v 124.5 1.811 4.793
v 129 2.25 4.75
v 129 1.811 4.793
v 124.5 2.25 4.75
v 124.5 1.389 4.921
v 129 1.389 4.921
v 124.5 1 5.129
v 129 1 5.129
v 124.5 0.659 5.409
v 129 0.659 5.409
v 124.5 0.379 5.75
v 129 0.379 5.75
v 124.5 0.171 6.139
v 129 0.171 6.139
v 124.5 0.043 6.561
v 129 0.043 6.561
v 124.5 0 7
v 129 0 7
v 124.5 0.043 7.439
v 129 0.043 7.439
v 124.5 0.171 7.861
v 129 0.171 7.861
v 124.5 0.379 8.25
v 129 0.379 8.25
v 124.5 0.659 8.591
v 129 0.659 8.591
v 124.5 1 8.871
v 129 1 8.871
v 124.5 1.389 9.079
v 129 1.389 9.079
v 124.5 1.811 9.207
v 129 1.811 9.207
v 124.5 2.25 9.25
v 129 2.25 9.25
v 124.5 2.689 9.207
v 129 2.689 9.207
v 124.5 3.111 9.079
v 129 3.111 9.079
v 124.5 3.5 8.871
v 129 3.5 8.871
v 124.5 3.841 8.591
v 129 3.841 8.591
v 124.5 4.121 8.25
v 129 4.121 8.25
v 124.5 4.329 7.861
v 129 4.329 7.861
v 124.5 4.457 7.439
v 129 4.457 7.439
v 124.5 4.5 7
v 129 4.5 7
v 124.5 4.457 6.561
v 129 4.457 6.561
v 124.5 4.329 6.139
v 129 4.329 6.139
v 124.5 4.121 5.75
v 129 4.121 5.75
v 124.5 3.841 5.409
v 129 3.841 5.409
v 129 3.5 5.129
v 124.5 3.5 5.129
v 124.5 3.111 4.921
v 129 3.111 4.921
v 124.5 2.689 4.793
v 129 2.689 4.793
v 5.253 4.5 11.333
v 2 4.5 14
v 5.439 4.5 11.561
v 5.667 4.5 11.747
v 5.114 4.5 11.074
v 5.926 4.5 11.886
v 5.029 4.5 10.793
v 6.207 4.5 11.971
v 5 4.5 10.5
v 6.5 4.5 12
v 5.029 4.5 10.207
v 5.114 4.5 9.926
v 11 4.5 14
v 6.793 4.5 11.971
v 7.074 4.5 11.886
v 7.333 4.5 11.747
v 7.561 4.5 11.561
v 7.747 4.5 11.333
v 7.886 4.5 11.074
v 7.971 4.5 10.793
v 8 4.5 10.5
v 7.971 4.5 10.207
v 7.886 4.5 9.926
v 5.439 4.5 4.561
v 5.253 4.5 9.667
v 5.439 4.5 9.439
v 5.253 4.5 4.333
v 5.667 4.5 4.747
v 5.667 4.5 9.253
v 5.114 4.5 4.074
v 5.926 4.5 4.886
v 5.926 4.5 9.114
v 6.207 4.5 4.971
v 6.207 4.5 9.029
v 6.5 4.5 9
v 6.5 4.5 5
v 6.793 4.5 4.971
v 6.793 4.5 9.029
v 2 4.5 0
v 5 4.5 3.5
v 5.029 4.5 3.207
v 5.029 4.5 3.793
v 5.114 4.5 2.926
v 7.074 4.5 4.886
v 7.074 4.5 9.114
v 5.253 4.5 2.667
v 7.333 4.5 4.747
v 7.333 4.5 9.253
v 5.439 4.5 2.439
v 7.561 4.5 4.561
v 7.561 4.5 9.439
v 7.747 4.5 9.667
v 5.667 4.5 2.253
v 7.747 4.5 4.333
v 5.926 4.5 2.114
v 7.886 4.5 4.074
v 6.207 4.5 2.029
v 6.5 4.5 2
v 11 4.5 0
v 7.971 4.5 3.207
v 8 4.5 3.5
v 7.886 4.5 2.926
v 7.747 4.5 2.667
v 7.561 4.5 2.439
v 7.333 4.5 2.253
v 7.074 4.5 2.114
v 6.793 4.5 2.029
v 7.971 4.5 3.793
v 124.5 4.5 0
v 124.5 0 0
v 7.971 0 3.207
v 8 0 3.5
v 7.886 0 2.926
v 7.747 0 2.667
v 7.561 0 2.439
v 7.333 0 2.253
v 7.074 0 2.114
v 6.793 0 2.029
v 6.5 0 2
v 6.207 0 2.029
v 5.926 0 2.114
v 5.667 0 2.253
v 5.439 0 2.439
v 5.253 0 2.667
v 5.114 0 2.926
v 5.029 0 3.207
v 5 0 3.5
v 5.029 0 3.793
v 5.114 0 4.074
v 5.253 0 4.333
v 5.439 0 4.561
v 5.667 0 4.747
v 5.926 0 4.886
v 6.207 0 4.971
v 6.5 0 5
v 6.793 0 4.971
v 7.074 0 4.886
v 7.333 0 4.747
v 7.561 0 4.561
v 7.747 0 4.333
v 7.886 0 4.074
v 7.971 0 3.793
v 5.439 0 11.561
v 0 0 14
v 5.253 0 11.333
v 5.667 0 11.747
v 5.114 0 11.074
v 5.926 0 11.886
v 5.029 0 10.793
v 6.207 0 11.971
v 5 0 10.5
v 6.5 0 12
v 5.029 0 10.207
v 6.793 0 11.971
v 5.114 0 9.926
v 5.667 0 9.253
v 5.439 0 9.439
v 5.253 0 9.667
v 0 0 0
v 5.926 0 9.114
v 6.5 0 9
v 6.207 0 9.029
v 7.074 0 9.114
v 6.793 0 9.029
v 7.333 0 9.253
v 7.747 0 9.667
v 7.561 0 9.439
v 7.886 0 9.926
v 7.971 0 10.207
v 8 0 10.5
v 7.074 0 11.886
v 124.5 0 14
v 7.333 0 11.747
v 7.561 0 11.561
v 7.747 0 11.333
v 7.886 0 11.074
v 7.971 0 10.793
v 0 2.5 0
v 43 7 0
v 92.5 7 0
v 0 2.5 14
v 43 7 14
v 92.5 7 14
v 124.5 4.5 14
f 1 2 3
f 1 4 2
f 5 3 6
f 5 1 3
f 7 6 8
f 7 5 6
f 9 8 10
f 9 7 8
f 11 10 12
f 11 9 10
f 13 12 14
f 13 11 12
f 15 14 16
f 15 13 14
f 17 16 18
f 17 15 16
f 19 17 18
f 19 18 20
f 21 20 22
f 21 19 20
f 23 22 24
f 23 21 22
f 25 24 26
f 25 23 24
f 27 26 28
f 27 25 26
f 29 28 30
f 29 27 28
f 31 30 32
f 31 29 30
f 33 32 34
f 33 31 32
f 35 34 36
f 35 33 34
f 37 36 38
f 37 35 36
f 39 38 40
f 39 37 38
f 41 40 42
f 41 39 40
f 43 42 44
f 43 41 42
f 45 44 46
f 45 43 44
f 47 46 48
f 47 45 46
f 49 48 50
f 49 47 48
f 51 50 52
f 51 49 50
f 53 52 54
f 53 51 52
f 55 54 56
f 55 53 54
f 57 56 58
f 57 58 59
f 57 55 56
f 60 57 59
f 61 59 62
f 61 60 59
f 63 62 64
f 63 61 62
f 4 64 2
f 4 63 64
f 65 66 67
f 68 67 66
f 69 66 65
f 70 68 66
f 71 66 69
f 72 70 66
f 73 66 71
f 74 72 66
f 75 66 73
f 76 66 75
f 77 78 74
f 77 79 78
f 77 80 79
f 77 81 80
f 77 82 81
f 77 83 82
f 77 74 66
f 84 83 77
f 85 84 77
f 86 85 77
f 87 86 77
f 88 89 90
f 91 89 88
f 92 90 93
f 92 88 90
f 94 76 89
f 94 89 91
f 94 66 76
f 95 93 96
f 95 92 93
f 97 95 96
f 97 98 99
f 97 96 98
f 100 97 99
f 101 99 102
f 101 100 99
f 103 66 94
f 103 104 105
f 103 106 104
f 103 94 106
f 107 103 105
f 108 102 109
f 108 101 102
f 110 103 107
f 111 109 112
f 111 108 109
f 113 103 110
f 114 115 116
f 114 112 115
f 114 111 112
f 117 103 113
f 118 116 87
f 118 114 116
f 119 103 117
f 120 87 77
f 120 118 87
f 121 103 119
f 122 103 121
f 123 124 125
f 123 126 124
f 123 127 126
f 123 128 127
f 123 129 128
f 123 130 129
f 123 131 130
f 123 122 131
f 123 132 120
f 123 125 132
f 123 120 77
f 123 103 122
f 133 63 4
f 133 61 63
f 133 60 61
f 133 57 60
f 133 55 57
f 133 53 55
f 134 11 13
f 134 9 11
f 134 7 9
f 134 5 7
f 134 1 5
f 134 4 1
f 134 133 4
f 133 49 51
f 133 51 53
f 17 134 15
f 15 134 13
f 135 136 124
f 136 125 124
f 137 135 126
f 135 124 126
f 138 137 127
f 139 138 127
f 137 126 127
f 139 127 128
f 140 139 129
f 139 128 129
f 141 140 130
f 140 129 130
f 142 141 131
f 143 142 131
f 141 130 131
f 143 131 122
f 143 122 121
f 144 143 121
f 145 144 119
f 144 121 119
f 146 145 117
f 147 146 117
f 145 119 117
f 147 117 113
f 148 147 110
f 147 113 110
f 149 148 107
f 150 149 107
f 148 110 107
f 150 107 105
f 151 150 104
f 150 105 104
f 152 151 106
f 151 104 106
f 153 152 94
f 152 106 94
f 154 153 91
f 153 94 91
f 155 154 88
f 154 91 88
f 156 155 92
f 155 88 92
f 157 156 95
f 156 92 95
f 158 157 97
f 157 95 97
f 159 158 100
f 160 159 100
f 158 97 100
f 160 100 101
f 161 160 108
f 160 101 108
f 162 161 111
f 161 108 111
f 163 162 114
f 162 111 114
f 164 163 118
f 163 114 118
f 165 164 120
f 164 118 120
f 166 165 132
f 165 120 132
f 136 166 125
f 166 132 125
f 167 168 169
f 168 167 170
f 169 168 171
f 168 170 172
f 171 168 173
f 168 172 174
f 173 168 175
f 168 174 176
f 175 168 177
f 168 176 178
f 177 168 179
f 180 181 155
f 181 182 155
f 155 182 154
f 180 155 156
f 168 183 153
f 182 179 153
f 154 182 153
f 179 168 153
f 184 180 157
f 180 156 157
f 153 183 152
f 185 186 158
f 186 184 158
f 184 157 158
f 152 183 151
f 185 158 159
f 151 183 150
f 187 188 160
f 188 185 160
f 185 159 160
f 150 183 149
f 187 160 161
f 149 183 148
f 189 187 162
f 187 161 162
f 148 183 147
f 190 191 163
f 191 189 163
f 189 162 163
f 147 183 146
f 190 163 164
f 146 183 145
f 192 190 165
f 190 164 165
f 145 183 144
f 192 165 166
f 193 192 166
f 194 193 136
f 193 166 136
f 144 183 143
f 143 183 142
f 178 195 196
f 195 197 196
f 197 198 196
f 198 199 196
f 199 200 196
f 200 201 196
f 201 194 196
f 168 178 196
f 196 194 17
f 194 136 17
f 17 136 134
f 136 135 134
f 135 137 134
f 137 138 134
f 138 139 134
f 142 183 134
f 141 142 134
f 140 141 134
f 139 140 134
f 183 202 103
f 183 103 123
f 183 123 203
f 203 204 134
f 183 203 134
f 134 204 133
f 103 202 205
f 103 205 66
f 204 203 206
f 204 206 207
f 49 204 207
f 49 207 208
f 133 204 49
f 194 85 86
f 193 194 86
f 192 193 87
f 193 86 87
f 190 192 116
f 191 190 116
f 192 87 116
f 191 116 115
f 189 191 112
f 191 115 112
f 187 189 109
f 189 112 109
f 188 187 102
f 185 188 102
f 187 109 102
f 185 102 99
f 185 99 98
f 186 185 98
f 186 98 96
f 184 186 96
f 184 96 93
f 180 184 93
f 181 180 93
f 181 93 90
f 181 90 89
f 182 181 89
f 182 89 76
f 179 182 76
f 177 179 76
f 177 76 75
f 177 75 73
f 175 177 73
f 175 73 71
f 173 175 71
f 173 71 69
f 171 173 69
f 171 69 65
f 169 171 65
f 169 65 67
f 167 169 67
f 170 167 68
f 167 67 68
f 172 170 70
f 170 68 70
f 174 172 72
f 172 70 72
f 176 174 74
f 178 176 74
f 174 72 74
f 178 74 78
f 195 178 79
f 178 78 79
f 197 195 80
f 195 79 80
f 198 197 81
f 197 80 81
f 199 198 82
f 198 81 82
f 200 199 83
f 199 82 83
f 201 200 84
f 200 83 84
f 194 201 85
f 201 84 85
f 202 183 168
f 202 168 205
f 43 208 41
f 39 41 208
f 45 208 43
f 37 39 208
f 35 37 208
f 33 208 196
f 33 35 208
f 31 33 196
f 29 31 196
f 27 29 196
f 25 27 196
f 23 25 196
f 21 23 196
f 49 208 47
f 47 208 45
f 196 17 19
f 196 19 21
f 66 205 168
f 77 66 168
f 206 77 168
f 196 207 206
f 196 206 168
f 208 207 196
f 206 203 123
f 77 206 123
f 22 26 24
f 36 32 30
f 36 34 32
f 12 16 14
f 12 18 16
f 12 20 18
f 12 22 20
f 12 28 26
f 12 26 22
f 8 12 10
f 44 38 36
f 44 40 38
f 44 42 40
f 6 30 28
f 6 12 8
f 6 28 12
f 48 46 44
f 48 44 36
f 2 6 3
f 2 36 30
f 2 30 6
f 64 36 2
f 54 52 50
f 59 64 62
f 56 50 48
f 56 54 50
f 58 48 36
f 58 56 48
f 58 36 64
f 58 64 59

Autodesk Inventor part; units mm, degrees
ref_plane "YZ Plane" through (0, 0, 0) normal (1, 0, 0) x (0, 1, 0)
ref_plane "XZ Plane" through (0, 0, 0) normal (0, 1, 0) x (-1, 0, 0)
ref_plane "XY Plane" through (0, 0, 0) normal (0, 0, 1) x (1, 0, 0)
sketch "Sketch1" plane through (0, 0, 0) normal (0, 0, 1) x (1, 0, 0)
  line L0 (0, 0) -> (0, 2.5)
  line L1 (2, 4.5) -> (11, 4.5)
  line L2 (0, 2.5) -> (2, 4.5)
  line L3 (0, 8.8411) -> (0, 0) construction
  line L4 (43, 7) -> (92.5, 7)
  line L5 (43, 11.0001) -> (43, -2.4525) construction
  line L6 (43, 7) -> (11, 4.5)
  line L7 (92.5, 7) -> (124.5, 4.5)
  line L8 (0, 0) -> (149.0621, 0)
  line L9 (124.5, 4.5) -> (124.5, 0)
  dimension "d0" = 4.5
  dimension "d1" = 45
  dimension "d2" = 7
  dimension "d3" = 9
  dimension "d4" = 32
  dimension "d5" = 49.5
  dimension "d8" = 32
  dimension "d9" = 2
  dimension "d10" = 4.5
extrude "Extrusion1" add sketch "Sketch1" along normal blind 14
sketch "Sketch2" plane through (124.5, 0, 0) normal (1, 0, 0) x (0, 0, -1)
  circle A0 centre (-7, 2.25) radius 2.25
  line L0 (0, 4.5) -> (-14, 4.5) projected
  line L1 (-7, 4.5) -> (-7, -0.9771) construction
  line L2 (0, 2.5) -> (-14, 2.5) projected
  point P0 (0, 0)
  dimension "d13" = 4.5
extrude "Extrusion2" add sketch "Sketch2" along normal blind 4.5
sketch "Sketch3" plane through (2, 4.5, 0) normal (0, 1, 0) x (1, 0, 0)
  circle A0 centre (4.5, -3.5) radius 1.5
  circle A1 centre (4.5, -10.5) radius 1.5
  line L0 (9, 0) -> (0, 0) projected
  line L1 (9, -14) -> (0, -14) projected
  line L2 (0, 0) -> (0, -14) projected
  point P0 (-2, 0)
  dimension "d16" = 7
  dimension "d17" = 3.5
  dimension "d18" = 3.5
  dimension "d19" = 4.5
  dimension "d20" = 3
  dimension "d21" = 3
extrude "Extrusion3" cut sketch "Sketch3" against normal blind 4.5
